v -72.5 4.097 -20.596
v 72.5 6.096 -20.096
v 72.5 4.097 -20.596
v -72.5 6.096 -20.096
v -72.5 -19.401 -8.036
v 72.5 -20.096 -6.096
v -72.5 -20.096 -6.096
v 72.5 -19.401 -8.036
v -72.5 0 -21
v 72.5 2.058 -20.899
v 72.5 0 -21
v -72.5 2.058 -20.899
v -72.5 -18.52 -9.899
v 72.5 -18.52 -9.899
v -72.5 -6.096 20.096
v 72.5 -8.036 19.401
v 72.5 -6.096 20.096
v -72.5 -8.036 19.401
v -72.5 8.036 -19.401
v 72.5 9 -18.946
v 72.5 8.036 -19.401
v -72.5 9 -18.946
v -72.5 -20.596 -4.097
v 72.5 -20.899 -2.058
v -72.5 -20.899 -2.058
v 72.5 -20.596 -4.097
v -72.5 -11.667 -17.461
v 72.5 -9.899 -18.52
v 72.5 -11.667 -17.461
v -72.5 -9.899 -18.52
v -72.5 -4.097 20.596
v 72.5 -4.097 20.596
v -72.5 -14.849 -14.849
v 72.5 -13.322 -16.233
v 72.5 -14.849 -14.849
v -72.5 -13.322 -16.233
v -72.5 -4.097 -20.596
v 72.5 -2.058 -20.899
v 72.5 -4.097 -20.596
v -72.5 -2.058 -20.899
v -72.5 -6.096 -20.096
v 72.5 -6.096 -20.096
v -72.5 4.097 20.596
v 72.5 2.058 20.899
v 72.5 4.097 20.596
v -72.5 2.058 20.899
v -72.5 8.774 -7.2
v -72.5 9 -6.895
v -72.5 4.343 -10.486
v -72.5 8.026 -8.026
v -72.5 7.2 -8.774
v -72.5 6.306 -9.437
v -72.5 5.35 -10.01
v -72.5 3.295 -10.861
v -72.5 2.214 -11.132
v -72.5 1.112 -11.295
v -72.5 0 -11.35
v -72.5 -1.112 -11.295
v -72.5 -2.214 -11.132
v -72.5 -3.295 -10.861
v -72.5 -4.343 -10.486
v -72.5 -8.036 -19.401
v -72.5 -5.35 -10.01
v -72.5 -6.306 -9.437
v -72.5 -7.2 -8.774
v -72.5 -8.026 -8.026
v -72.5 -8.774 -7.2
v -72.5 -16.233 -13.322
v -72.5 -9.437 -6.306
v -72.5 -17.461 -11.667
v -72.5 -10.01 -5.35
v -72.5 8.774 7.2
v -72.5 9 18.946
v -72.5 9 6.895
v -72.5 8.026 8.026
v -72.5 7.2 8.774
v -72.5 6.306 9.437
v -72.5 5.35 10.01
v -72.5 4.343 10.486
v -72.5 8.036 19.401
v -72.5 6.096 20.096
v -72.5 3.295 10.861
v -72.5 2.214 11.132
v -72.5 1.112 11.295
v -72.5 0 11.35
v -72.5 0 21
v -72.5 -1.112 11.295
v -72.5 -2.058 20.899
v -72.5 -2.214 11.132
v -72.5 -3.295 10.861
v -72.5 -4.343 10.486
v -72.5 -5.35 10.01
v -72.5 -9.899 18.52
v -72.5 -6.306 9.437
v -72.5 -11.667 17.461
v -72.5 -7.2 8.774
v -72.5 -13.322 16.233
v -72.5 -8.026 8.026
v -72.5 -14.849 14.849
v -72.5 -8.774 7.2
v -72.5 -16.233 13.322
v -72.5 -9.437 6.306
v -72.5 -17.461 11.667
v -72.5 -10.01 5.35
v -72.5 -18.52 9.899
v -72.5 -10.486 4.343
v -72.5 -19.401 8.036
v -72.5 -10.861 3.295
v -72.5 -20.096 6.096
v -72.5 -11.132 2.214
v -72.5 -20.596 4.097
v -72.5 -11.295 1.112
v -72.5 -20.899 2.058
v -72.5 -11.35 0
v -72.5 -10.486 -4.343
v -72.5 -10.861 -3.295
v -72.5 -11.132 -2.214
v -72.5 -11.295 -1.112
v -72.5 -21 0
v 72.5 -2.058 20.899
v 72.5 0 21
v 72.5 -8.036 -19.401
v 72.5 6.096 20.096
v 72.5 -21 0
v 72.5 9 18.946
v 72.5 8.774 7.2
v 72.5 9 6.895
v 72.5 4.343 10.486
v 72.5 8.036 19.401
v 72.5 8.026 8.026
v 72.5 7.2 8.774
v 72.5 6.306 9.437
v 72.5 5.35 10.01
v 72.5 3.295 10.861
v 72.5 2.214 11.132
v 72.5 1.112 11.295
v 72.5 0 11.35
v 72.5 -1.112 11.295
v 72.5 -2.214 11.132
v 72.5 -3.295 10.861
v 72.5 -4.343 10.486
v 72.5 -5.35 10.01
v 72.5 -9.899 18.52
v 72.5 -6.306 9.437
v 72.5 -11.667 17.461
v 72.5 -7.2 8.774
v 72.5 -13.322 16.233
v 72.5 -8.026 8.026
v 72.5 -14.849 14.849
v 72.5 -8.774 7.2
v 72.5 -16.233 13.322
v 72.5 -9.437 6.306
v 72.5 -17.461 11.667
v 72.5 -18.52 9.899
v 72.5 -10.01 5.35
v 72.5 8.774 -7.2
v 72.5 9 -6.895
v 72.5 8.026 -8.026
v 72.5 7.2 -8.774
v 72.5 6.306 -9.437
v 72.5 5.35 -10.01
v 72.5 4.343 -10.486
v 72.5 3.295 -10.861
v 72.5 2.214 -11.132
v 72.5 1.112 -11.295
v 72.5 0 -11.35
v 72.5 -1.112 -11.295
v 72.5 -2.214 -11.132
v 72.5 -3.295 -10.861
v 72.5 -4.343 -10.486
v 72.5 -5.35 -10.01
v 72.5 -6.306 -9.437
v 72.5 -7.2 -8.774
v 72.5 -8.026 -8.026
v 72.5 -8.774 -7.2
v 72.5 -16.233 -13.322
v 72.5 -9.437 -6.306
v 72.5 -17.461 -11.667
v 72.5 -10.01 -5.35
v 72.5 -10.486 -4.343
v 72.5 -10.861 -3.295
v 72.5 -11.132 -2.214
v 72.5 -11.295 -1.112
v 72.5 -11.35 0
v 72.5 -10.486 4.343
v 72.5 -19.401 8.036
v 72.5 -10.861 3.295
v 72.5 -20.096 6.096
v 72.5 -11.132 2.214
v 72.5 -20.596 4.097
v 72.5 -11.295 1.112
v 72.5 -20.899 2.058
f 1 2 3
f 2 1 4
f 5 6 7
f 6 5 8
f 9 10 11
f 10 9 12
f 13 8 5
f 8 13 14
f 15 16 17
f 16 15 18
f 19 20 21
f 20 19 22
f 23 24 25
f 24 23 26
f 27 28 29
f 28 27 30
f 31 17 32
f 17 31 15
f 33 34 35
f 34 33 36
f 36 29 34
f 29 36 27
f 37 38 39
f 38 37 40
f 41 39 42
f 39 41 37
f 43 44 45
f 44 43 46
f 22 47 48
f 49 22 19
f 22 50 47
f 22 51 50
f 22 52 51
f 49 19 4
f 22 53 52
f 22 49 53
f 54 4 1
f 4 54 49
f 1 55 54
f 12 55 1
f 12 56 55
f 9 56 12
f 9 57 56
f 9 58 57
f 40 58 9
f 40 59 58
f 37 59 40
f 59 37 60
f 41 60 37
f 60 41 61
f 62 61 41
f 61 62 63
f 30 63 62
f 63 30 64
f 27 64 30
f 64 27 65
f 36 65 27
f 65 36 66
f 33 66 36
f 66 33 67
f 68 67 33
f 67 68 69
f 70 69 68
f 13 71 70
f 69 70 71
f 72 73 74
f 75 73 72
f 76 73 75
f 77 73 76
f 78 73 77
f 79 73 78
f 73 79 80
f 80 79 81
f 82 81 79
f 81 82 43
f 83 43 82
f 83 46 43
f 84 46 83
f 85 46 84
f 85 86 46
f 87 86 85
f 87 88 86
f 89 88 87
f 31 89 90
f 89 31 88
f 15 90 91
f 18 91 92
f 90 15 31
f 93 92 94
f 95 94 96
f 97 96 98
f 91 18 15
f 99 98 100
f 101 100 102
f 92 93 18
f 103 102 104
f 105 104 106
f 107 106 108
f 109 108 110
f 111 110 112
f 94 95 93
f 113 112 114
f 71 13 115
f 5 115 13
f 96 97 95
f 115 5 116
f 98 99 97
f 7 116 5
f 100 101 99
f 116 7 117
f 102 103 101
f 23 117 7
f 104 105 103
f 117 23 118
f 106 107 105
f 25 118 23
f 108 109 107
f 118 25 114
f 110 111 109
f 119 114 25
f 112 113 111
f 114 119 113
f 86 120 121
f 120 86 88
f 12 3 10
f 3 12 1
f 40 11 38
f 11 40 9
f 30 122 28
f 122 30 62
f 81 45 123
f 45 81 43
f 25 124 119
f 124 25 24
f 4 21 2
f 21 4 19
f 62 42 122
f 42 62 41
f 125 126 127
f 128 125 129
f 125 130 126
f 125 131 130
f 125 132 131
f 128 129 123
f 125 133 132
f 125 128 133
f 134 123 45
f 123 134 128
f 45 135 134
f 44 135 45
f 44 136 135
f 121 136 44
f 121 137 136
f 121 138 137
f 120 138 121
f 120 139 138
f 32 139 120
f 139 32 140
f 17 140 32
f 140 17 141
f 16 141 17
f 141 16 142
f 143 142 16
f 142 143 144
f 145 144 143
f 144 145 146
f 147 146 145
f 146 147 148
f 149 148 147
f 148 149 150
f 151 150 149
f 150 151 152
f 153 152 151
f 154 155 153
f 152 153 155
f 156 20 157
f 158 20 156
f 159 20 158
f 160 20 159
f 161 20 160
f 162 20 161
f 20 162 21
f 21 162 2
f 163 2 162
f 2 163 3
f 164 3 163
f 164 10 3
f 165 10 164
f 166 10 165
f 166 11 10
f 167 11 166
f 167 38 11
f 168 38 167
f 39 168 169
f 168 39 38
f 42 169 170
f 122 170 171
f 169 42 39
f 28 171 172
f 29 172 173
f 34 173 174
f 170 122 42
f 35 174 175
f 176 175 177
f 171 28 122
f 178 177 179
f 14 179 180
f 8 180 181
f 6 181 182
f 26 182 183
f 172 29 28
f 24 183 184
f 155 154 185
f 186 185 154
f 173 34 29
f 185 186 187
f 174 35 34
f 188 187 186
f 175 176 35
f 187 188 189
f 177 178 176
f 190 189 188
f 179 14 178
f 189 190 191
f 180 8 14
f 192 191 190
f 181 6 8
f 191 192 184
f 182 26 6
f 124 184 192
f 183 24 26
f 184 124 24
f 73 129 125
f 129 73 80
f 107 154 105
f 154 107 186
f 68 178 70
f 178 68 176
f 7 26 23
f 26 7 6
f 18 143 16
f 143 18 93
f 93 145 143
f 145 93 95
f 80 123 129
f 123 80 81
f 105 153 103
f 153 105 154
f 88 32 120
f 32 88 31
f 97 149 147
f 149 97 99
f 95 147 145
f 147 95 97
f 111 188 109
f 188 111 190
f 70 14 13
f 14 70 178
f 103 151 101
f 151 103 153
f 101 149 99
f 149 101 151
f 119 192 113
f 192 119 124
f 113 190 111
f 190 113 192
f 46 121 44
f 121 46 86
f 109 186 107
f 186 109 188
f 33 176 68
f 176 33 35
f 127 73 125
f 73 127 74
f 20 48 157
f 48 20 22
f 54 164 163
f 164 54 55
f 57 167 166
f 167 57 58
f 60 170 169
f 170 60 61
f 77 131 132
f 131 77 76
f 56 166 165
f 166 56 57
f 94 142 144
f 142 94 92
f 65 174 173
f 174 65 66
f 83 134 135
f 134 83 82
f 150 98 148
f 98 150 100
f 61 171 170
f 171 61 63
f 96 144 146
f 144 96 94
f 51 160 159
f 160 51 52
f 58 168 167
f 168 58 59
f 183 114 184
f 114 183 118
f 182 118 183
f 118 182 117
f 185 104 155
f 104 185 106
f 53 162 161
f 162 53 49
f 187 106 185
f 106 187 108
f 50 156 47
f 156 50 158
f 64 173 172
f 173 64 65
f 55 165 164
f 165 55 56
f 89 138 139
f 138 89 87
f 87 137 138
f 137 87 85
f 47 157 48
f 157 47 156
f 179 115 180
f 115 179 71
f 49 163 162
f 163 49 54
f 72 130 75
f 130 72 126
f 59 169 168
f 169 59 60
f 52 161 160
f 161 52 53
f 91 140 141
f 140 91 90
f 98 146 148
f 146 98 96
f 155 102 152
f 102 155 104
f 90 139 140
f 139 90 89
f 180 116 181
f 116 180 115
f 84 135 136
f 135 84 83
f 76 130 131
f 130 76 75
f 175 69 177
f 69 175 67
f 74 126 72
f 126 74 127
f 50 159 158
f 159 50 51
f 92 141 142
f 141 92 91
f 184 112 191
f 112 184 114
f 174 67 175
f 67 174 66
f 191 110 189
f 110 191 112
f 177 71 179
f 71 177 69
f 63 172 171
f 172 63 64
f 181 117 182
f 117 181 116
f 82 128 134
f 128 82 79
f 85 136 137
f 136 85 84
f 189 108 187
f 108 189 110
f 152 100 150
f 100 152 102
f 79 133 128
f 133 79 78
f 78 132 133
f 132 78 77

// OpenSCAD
$fn=64;len=145;od=42;id=22.7;
difference(){intersection(){rotate([0,90,0])cylinder(h=len,d=od,center=true);translate([0,-12,0])cube([len+4,od,od+4],center=true);}rotate([0,90,0])cylinder(h=len+4,d=id,center=true);}
